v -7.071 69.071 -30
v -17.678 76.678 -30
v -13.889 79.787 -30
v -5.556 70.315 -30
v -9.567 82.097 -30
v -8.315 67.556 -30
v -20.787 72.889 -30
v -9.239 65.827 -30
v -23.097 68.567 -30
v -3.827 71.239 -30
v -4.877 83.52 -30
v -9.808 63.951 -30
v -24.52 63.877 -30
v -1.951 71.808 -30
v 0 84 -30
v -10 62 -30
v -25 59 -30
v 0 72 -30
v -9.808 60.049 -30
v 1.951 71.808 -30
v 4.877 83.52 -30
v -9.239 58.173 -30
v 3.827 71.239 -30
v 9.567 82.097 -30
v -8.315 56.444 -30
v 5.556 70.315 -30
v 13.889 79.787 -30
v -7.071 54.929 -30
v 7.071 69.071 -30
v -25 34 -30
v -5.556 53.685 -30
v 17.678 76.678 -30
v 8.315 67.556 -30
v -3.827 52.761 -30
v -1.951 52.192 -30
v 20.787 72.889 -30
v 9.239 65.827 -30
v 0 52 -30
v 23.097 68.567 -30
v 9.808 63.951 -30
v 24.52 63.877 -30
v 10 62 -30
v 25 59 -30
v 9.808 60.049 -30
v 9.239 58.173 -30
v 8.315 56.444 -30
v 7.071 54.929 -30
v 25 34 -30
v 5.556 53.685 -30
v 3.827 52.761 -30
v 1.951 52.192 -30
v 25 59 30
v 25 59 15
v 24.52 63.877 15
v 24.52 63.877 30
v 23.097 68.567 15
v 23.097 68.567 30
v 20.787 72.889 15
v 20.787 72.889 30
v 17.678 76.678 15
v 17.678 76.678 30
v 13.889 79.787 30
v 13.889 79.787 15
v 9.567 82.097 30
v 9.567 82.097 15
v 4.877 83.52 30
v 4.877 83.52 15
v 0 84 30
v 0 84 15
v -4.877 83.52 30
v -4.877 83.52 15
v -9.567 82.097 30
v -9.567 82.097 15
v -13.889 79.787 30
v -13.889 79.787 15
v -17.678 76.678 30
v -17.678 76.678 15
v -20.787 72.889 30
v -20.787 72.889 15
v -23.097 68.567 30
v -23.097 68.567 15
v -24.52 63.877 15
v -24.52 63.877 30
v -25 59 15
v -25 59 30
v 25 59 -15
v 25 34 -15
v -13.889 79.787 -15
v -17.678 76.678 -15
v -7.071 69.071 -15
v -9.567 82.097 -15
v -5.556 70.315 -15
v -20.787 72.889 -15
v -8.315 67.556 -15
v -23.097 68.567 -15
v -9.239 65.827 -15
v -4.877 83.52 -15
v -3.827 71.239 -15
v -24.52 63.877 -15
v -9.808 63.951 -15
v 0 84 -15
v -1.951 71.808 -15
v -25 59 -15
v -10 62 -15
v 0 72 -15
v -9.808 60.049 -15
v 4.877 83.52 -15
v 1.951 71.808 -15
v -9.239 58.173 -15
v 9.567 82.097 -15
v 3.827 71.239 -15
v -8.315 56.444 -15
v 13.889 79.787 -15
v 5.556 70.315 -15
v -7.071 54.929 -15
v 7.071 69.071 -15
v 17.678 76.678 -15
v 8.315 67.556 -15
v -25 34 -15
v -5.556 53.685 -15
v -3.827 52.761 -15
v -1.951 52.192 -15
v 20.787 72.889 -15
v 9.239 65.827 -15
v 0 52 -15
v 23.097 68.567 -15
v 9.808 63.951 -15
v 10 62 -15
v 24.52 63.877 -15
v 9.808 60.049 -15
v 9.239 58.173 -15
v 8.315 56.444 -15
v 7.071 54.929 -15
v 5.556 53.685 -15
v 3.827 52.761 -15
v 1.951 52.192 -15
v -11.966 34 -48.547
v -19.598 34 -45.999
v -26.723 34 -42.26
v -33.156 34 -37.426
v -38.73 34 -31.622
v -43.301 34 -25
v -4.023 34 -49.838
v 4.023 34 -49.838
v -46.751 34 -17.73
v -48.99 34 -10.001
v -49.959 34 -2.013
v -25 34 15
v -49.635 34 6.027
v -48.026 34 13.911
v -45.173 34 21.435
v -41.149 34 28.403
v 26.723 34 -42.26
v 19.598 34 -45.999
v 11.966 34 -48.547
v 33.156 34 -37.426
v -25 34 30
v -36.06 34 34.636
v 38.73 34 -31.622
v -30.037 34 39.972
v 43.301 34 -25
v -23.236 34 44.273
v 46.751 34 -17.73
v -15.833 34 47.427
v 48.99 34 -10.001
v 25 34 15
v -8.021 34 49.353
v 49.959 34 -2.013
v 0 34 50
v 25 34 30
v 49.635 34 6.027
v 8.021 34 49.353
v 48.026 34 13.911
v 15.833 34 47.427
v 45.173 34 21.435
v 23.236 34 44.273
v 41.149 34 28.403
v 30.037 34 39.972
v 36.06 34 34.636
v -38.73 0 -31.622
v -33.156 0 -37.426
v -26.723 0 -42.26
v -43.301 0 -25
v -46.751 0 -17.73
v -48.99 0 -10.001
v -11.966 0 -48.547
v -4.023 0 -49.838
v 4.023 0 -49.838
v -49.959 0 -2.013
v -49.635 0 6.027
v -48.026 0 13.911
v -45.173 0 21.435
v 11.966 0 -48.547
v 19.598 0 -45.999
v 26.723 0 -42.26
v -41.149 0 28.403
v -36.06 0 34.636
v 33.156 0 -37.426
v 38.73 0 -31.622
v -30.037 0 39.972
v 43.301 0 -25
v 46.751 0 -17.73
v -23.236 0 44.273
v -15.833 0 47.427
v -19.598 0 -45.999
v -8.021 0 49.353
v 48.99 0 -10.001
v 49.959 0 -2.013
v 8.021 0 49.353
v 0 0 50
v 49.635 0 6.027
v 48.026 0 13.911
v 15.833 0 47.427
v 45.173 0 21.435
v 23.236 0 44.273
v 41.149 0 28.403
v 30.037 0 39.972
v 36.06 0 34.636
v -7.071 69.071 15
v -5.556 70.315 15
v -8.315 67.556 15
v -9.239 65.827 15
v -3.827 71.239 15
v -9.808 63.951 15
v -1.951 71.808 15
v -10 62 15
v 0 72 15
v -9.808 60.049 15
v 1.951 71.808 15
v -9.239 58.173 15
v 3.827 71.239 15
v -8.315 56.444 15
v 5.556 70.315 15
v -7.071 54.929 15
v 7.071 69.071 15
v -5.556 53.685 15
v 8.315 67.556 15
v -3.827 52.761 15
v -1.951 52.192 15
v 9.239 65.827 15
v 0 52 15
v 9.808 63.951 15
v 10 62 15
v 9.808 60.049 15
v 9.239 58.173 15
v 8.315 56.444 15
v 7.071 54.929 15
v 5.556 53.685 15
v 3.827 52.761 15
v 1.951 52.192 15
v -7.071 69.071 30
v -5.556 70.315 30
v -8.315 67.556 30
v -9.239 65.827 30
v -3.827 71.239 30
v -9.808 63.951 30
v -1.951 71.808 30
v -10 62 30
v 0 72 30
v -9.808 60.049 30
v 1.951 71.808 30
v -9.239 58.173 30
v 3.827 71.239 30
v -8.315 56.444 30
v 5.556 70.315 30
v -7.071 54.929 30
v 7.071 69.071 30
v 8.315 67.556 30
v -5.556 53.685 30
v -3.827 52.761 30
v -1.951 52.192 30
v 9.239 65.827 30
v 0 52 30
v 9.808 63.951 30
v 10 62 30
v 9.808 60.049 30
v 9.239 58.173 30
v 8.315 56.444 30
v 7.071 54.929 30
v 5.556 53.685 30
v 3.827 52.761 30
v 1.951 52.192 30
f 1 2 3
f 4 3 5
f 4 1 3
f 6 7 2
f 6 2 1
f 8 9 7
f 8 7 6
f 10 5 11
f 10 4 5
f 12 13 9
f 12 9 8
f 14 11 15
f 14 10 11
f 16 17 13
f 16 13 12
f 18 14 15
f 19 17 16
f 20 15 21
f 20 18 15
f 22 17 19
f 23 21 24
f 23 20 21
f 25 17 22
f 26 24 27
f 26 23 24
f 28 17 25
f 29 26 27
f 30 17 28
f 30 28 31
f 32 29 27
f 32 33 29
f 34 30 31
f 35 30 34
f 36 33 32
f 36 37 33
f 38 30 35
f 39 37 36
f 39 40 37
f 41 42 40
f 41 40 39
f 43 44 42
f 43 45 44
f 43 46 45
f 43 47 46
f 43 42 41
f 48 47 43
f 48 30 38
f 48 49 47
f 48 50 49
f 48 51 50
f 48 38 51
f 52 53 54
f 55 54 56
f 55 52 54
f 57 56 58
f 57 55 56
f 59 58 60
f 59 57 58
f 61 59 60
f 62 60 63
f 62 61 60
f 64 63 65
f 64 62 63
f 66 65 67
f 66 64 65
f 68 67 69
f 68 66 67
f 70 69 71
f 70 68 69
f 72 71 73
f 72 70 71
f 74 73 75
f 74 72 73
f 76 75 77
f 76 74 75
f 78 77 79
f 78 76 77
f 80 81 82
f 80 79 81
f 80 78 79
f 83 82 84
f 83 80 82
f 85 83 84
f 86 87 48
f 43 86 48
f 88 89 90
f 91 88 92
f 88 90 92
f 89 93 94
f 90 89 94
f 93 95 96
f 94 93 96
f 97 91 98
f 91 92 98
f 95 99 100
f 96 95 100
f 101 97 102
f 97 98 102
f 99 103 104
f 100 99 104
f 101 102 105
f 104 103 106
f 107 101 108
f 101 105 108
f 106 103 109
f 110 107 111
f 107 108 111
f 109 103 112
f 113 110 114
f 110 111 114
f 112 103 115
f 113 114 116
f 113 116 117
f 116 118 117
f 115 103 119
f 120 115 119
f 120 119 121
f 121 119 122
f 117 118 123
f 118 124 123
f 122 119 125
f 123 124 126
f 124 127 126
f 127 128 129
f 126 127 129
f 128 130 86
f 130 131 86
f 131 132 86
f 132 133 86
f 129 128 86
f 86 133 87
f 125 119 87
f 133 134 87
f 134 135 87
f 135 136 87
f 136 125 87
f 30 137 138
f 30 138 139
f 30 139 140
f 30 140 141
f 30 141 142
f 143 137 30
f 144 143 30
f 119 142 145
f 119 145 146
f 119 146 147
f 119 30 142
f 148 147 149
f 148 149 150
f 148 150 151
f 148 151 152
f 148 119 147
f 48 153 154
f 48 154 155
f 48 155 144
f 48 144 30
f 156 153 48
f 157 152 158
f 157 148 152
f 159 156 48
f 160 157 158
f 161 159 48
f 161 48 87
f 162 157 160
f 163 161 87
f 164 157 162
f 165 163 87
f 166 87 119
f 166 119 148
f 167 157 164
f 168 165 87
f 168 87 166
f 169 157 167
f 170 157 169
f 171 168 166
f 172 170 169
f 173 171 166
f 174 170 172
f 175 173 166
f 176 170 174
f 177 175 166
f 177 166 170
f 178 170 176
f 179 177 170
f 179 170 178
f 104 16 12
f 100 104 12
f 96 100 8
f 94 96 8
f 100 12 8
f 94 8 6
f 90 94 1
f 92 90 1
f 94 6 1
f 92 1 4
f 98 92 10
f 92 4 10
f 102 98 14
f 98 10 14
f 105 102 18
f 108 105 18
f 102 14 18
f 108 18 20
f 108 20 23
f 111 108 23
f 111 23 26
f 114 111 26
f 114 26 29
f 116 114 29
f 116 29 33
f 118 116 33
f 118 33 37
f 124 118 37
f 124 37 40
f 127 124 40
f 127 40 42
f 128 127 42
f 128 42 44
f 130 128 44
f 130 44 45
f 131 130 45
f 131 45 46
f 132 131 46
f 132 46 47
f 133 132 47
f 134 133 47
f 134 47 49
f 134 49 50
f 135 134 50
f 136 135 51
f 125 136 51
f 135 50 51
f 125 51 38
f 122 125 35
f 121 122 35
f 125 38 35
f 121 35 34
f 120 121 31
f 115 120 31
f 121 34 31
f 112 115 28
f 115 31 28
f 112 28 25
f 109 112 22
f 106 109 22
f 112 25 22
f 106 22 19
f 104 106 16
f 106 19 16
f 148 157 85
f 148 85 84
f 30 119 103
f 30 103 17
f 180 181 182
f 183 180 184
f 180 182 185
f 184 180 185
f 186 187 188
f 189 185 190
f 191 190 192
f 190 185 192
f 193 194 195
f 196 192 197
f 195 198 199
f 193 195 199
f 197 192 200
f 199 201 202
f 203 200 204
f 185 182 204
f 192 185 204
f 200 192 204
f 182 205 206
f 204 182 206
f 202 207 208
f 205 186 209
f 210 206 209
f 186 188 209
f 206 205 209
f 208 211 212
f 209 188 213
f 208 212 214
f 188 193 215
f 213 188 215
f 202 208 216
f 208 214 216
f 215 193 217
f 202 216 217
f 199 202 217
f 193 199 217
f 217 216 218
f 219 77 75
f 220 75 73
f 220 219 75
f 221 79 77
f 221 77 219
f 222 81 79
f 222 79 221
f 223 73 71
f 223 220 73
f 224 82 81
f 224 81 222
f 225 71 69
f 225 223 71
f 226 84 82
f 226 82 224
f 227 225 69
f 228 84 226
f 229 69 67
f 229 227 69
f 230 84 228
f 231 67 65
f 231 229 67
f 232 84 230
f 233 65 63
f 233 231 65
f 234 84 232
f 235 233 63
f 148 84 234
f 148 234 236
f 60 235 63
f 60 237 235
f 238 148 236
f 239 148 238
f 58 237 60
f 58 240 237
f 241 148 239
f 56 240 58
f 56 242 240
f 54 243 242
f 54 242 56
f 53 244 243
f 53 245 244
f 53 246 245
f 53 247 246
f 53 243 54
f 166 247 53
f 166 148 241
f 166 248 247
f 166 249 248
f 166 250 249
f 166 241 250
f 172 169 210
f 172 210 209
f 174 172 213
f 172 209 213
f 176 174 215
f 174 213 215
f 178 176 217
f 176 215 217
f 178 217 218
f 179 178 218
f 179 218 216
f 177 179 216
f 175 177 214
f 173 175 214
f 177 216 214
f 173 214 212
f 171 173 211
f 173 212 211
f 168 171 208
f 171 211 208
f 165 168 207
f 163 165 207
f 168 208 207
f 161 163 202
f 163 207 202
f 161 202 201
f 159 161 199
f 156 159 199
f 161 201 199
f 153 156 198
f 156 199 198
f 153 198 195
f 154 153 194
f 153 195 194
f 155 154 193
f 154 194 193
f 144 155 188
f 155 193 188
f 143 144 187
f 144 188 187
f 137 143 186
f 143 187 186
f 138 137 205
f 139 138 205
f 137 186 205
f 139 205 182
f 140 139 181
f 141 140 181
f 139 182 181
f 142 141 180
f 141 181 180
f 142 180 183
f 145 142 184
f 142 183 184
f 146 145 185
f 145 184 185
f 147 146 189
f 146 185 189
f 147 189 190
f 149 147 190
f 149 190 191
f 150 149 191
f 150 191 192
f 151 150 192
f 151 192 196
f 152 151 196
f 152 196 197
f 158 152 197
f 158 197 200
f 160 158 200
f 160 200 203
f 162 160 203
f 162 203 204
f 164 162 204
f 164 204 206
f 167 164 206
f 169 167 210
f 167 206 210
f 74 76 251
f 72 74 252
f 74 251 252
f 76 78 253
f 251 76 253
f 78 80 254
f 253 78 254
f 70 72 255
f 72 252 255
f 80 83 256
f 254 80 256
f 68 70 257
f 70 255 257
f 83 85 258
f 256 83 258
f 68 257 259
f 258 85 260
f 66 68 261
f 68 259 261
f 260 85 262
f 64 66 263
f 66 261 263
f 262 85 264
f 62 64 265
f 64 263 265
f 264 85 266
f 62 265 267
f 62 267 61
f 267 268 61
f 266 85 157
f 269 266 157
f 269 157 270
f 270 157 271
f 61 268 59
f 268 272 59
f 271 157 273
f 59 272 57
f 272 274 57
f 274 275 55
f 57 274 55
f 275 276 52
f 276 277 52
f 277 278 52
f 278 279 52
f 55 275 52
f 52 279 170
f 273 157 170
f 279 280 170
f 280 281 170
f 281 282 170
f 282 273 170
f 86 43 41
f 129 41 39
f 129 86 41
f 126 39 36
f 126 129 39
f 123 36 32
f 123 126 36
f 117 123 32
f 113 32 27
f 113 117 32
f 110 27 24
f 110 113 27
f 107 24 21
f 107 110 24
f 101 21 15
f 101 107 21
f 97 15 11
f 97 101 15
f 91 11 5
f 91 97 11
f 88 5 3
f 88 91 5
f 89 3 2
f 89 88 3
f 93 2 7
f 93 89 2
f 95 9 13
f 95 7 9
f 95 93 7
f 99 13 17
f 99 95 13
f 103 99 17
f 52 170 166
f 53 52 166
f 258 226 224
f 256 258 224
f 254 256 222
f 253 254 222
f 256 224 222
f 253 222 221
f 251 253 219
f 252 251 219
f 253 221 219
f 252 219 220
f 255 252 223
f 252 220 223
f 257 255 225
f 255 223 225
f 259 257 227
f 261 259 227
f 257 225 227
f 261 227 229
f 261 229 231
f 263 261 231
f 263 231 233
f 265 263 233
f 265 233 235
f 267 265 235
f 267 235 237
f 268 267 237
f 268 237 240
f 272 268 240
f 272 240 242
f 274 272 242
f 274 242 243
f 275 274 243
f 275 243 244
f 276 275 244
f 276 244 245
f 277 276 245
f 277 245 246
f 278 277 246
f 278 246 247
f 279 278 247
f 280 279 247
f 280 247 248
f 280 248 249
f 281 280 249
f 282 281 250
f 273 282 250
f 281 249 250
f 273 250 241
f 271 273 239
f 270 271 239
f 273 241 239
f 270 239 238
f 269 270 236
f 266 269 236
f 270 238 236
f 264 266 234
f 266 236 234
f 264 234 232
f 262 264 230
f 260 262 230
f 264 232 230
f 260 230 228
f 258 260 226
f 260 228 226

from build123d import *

# Parameters (mm, degrees)
CROQUIS1_R              = 50
SALIENTE_EXTRUIR1_DEPTH = 34
CROQUIS2_W              = 50
CROQUIS2_H              = 15
SALIENTE_EXTRUIR2_DEPTH = 50
CROQUIS4_R              = 10
CORTAR_EXTRUIR1_DEPTH   = 60
REDONDEO1_RADIUS        = 25
REDONDEO1_LENGTH        = 15
REDONDEO2_RADIUS        = 25
REDONDEO2_LENGTH        = 15


with BuildPart() as part:
    # Croquis1 → Saliente-Extruir1 (new body)
    with BuildSketch(Plane(origin=(0, 0, 0), x_dir=(1, 0, 0), z_dir=(0, 1, 0))):
        with Locations(Location((0, 0, 0), (0, 0, 270))):
            Circle(CROQUIS1_R)
    extrude(amount=SALIENTE_EXTRUIR1_DEPTH)

    # Croquis2 → Saliente-Extruir2 (add)
    with BuildSketch(Plane(origin=(0, 34, 0), x_dir=(1, 0, 0), z_dir=(0, 1, 0))):
        with Locations((0, 22.5)):
            Rectangle(CROQUIS2_W, CROQUIS2_H)
        with Locations((0, -22.5)):
            Rectangle(CROQUIS2_W, CROQUIS2_H)
    extrude(amount=SALIENTE_EXTRUIR2_DEPTH)

    # Croquis4 → Cortar-Extruir1 (cut)
    with BuildSketch(Plane(origin=(0, 0, -30), x_dir=(-1, 0, 0), z_dir=(0, 0, -1))):
        with Locations((0, 62)):
            Circle(CROQUIS4_R)
    extrude(amount=-CORTAR_EXTRUIR1_DEPTH, mode=Mode.SUBTRACT)

    # Redondeo1: full round fillet: the end face becomes a half cylinder, R = half its width
    redondeo1_face = Plane((0, 84, -22.5), x_dir=(0, 0, 1), z_dir=(0, 1, 0))  # on the end face: x along it, z out of the body
    redondeo1_slab = redondeo1_face.offset(-REDONDEO1_RADIUS / 2) * Box(REDONDEO1_LENGTH, 2 * REDONDEO1_RADIUS, REDONDEO1_RADIUS, mode=Mode.PRIVATE)  # the body's end, R deep
    redondeo1_round = Plane((0, 59, -22.5), x_dir=(0, 1, 0), z_dir=(0, 0, 1)) * Cylinder(REDONDEO1_RADIUS, REDONDEO1_LENGTH, mode=Mode.PRIVATE)  # its axis R under the face
    add(redondeo1_slab - redondeo1_round, mode=Mode.SUBTRACT)

    # Redondeo2: full round fillet: the end face becomes a half cylinder, R = half its width
    redondeo2_face = Plane((0, 84, 22.5), x_dir=(0, 0, 1), z_dir=(0, 1, 0))  # on the end face: x along it, z out of the body
    redondeo2_slab = redondeo2_face.offset(-REDONDEO2_RADIUS / 2) * Box(REDONDEO2_LENGTH, 2 * REDONDEO2_RADIUS, REDONDEO2_RADIUS, mode=Mode.PRIVATE)  # the body's end, R deep
    redondeo2_round = Plane((0, 59, 22.5), x_dir=(0, 1, 0), z_dir=(0, 0, 1)) * Cylinder(REDONDEO2_RADIUS, REDONDEO2_LENGTH, mode=Mode.PRIVATE)  # its axis R under the face
    add(redondeo2_slab - redondeo2_round, mode=Mode.SUBTRACT)


solid = part.part
